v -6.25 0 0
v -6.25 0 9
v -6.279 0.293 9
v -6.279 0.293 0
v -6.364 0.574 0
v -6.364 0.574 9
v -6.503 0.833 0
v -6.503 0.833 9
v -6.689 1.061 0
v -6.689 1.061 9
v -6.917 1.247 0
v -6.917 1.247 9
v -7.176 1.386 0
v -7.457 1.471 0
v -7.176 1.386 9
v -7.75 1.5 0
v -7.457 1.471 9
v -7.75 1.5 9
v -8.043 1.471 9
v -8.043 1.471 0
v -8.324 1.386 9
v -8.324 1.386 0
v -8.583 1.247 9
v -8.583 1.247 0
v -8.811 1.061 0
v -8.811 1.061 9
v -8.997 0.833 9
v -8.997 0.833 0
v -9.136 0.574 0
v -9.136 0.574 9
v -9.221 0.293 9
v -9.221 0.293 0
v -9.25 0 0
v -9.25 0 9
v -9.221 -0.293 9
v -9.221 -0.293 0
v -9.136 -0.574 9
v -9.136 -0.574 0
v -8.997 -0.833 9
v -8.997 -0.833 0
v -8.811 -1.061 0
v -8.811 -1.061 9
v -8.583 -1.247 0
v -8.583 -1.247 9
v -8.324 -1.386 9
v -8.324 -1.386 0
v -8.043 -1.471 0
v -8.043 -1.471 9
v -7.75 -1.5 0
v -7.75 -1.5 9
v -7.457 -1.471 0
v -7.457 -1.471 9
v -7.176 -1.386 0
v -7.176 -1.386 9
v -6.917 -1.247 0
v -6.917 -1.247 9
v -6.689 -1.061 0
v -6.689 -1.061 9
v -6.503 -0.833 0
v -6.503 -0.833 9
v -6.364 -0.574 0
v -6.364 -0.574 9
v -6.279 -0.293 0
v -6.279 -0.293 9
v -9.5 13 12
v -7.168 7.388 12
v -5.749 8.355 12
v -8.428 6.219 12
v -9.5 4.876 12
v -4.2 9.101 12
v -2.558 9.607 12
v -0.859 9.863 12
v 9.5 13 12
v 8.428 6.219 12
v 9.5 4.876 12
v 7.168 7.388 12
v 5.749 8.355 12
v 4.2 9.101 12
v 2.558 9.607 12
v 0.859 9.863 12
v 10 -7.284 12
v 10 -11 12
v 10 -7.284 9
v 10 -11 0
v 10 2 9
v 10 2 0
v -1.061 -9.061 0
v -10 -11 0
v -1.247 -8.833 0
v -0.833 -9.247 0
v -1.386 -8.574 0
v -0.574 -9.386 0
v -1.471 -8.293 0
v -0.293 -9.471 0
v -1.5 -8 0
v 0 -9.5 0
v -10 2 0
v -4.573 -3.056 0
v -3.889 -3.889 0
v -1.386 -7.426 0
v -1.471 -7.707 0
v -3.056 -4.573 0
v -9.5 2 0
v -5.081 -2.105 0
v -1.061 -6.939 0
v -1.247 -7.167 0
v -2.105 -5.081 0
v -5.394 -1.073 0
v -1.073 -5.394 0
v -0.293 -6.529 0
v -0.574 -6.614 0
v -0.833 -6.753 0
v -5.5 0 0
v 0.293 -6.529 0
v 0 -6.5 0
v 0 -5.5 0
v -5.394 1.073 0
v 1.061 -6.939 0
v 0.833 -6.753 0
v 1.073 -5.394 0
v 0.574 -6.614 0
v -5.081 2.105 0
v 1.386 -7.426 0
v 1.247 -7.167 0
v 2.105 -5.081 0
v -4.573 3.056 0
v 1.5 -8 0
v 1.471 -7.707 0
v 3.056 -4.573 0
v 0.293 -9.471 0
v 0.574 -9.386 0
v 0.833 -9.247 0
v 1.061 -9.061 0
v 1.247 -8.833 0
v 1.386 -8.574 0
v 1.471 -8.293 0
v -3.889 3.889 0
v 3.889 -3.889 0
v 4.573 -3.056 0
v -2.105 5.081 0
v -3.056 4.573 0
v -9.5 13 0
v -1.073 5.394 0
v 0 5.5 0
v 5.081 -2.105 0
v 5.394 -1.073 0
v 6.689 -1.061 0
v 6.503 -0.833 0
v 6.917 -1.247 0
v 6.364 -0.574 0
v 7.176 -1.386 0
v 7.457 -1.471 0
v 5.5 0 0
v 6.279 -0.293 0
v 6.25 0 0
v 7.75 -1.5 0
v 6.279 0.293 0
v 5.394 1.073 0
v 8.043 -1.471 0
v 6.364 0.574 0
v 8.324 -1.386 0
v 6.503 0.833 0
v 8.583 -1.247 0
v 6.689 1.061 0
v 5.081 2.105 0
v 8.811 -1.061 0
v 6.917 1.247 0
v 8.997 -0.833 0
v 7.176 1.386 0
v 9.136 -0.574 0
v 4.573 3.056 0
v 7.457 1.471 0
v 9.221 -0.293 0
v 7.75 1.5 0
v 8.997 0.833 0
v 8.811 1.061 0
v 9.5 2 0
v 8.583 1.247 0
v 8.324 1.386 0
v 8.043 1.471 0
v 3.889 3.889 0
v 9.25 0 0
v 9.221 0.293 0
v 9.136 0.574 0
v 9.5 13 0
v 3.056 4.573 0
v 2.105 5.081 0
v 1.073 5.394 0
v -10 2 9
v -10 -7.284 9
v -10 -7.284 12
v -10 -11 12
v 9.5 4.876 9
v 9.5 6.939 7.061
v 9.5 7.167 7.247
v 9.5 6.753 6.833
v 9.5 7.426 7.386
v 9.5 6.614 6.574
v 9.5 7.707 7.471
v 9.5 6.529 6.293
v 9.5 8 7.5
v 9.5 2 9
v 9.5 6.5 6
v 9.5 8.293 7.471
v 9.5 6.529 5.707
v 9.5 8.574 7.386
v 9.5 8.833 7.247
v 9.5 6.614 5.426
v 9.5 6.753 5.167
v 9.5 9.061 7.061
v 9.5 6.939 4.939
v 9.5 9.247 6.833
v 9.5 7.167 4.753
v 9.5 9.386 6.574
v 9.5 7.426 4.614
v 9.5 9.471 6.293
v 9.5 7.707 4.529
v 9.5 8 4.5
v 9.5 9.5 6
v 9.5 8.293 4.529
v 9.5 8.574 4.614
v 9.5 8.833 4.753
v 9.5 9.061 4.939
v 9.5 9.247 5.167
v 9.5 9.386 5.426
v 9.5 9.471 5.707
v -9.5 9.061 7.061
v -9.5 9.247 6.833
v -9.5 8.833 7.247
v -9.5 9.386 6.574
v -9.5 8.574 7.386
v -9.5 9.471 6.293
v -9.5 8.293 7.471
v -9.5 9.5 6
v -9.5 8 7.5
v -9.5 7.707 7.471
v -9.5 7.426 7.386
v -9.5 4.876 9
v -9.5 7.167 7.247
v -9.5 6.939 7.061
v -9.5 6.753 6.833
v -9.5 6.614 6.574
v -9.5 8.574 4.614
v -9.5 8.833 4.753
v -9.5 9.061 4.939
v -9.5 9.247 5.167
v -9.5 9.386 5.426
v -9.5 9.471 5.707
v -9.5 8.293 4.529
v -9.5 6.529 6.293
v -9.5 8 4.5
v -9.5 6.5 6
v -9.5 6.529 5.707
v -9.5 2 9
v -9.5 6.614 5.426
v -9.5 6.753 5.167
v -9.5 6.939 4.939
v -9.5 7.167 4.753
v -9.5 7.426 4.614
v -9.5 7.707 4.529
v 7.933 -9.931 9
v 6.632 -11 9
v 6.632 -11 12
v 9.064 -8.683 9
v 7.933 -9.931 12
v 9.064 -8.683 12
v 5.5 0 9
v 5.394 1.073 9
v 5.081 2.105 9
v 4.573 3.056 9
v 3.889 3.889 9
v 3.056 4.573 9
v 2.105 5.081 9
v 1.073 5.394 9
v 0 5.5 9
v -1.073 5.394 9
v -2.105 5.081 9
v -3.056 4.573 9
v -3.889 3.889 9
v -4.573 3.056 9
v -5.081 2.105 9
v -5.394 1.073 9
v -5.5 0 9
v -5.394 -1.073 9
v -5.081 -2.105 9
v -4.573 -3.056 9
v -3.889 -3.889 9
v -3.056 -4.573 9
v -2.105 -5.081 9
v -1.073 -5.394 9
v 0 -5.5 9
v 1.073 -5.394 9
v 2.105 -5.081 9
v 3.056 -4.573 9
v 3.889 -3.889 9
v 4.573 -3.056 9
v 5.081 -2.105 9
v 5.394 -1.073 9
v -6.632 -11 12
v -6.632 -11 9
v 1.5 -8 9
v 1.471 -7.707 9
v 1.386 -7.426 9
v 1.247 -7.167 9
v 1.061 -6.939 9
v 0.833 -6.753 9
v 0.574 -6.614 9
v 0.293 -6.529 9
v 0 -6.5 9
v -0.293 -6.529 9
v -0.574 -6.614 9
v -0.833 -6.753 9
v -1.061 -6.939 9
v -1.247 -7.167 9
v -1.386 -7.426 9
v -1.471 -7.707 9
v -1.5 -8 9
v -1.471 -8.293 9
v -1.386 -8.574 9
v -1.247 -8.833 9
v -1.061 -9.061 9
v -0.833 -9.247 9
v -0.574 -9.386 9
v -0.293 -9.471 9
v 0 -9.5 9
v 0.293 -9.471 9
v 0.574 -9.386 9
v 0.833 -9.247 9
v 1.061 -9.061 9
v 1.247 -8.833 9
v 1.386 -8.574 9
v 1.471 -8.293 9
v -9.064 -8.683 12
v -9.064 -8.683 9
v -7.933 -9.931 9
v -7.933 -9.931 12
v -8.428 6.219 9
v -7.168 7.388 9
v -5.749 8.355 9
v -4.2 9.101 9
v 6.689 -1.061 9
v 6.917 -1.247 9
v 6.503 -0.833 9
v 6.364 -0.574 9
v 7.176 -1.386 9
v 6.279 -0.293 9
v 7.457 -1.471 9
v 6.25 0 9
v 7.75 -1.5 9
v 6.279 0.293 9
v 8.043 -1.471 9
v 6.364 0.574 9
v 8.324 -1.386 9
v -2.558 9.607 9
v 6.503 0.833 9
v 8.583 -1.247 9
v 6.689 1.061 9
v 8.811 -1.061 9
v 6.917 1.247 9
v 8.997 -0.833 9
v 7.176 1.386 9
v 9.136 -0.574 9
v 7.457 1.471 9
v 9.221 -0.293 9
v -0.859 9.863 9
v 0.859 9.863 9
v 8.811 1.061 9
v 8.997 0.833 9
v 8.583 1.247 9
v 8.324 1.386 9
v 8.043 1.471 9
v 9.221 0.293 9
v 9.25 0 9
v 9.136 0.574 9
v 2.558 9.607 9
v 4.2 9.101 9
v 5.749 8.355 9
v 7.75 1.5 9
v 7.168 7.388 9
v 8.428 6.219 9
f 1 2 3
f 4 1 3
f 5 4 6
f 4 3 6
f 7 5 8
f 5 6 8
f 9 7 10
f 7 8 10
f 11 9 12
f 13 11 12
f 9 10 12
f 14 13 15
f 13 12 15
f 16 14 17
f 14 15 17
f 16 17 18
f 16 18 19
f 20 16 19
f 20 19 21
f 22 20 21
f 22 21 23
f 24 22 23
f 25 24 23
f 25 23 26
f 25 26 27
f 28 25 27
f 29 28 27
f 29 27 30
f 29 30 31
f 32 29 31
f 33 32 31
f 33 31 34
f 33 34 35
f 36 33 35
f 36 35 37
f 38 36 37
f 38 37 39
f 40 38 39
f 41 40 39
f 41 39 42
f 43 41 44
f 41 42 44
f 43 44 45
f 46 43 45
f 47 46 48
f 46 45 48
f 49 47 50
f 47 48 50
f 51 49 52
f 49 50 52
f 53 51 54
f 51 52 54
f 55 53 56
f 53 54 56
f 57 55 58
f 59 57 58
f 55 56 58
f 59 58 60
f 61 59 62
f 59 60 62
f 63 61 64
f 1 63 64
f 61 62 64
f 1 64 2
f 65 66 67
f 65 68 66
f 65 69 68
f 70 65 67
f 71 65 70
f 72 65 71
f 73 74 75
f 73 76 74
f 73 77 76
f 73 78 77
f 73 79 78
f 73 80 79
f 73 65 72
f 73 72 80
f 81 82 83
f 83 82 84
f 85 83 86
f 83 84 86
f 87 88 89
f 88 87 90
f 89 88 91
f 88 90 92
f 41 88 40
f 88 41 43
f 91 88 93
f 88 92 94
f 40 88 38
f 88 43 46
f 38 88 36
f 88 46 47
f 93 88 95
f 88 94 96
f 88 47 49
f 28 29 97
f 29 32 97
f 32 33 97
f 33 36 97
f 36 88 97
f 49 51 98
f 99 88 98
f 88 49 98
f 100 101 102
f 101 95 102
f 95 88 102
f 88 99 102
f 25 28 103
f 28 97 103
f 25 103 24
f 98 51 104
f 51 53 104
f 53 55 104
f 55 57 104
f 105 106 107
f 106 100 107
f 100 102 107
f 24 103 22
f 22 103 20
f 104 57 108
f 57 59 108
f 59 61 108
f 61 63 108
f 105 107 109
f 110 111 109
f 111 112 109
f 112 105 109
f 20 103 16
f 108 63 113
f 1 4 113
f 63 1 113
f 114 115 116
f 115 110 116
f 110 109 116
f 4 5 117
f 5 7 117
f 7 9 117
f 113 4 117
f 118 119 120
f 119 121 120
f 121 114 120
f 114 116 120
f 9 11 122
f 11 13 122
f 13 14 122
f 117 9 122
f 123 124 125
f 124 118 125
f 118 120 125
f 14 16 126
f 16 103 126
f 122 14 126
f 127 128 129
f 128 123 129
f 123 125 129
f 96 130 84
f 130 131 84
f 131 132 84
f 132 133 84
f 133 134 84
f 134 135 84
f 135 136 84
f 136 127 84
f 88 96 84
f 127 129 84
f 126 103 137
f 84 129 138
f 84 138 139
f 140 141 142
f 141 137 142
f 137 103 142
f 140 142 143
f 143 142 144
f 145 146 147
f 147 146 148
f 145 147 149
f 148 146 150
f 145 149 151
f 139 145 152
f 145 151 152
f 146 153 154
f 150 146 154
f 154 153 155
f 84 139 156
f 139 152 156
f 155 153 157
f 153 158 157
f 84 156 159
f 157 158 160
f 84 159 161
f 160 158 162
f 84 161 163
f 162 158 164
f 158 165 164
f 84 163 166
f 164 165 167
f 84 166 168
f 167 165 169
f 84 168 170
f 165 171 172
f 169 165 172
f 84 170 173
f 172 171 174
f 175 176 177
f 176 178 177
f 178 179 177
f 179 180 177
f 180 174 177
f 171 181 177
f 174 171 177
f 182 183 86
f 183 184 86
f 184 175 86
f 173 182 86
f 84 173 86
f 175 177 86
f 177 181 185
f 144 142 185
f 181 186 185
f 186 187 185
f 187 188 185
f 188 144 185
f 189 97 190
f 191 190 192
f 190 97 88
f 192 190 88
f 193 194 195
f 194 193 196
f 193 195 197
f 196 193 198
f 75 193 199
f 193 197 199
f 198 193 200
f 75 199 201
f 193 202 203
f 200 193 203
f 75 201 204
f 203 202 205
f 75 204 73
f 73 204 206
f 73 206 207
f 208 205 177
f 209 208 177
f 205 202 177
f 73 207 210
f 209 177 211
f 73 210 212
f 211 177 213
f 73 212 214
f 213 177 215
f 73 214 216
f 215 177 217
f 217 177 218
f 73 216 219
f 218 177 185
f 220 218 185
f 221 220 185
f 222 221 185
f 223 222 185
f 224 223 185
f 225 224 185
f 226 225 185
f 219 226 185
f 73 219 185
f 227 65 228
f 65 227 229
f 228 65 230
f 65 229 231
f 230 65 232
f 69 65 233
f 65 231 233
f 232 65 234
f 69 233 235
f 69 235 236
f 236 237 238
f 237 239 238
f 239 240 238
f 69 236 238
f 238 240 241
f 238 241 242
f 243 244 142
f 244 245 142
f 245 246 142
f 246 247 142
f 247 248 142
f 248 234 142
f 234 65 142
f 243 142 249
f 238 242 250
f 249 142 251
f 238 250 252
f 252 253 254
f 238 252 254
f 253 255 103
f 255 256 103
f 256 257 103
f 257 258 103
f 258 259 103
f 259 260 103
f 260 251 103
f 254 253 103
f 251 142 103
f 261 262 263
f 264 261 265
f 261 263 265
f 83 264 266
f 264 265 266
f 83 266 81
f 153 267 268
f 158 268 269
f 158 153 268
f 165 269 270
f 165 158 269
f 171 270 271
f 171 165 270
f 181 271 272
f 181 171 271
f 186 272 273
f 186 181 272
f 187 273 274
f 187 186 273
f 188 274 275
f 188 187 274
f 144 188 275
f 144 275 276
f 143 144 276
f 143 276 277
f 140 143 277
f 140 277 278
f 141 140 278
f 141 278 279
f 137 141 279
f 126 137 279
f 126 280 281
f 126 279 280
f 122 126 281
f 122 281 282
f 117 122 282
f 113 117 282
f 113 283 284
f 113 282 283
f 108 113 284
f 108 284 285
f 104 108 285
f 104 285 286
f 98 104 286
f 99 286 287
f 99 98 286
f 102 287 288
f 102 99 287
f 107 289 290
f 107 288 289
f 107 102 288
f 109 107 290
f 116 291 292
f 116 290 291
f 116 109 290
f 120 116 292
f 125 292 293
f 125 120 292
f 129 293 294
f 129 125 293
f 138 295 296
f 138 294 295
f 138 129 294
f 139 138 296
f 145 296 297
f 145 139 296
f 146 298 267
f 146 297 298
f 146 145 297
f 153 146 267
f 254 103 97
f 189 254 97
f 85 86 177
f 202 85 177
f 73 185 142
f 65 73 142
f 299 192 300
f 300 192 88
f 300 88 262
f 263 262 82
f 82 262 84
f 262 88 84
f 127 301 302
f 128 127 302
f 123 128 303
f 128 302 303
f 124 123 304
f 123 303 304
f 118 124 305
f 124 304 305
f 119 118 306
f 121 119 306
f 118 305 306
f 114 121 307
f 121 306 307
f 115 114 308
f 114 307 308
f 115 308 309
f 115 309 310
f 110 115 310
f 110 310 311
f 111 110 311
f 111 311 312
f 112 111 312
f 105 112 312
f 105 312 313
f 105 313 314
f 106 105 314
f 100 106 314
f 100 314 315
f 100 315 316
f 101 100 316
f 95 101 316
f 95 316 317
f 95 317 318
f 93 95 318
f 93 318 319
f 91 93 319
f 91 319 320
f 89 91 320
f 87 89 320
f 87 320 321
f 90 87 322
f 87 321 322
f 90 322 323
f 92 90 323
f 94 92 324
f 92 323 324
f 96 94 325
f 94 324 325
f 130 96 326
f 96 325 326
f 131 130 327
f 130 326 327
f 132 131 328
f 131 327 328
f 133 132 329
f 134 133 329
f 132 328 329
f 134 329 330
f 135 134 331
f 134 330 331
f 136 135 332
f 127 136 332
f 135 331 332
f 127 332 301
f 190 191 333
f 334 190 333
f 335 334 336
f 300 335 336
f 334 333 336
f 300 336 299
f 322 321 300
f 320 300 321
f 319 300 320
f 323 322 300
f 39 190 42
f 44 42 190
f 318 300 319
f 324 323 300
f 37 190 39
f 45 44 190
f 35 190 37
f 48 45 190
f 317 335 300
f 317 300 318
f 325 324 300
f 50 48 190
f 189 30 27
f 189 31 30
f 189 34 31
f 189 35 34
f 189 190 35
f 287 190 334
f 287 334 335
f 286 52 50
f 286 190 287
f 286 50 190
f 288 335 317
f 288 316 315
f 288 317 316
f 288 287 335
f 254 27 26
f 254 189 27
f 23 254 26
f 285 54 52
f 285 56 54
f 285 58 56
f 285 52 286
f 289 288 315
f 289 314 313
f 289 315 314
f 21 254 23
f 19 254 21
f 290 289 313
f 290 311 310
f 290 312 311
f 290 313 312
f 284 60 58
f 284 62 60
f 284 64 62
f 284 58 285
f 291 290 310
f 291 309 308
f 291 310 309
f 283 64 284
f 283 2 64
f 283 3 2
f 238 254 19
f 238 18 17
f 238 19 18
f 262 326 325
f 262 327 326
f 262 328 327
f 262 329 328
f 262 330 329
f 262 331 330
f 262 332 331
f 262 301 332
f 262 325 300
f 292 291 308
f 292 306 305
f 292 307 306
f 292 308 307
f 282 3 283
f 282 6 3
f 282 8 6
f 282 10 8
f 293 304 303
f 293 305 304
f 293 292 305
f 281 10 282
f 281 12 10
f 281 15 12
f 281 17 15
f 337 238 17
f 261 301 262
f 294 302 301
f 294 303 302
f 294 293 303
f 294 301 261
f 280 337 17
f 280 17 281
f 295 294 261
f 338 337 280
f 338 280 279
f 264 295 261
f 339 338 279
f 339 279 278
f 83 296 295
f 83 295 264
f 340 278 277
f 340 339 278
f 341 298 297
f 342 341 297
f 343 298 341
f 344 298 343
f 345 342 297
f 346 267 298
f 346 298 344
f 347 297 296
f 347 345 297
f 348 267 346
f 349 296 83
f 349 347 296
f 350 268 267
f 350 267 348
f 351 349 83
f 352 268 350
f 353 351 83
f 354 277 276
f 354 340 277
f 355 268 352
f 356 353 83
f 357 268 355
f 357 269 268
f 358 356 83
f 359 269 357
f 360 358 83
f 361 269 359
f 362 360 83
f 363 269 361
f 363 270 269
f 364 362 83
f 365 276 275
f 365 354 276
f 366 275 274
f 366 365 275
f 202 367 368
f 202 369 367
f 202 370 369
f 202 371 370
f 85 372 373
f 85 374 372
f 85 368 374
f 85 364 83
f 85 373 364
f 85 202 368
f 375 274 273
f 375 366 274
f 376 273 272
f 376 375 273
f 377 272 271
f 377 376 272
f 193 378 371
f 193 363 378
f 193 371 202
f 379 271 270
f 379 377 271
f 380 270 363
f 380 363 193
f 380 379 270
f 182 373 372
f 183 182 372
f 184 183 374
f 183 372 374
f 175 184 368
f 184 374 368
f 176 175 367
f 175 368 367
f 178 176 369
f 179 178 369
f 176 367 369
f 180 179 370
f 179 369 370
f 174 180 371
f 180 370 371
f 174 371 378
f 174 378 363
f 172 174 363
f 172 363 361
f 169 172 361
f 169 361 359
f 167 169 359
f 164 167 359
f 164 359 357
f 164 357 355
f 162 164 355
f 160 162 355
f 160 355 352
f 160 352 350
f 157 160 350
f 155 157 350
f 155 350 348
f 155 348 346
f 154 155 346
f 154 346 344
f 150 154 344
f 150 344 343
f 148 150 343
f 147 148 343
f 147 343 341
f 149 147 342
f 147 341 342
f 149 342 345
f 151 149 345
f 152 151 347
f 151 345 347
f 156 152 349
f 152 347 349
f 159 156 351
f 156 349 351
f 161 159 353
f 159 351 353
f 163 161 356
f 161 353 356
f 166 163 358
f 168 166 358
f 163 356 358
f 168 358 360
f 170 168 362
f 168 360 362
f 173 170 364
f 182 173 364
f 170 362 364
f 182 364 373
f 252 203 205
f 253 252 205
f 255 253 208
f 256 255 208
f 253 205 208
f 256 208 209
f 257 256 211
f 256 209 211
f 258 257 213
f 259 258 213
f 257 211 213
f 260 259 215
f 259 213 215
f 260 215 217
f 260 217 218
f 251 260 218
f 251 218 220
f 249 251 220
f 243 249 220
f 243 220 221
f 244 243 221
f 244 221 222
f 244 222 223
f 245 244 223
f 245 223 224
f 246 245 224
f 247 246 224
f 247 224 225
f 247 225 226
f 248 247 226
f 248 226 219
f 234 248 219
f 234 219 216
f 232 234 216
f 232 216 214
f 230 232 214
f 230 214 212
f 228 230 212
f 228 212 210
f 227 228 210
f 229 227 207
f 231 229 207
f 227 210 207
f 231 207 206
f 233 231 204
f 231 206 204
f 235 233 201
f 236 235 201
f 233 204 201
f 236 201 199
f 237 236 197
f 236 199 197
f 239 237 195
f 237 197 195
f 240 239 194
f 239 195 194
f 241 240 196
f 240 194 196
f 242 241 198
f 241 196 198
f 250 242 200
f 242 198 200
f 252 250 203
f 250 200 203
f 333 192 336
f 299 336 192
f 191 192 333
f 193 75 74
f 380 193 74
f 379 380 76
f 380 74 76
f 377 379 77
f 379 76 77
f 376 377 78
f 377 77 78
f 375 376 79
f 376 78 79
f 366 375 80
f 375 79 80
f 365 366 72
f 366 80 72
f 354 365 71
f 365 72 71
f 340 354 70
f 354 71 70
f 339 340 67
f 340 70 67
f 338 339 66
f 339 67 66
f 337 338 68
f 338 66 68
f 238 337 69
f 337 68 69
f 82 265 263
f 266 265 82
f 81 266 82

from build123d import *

# Parameters (mm, degrees)
F0_R     = 5.5
F1_DEPTH = 12
F2_R     = 1.5
F3_DEPTH = 12
F5_DEPTH = 22
F6_R     = 11.5
F7_DEPTH = 3


with BuildPart() as f1:
    # F0 (on Top) → F1 (new body)
    with BuildSketch(Plane.XY):
        Polygon((9.5, 2), (9.5, 13), (-9.5, 13), (-9.5, 2), (-10, 2), (-10, -11), (10, -11), (10, 2), align=None)
        Circle(F0_R, mode=Mode.SUBTRACT)
    extrude(amount=F1_DEPTH)

    # F2 (on face) → F3 (cut)
    with BuildSketch(Plane.XY.offset(12)):
        with Locations((7.75, 0)):
            Circle(F2_R)
        with Locations((-7.75, 0)):
            Circle(F2_R)
        with Locations((0, -8)):
            Circle(F2_R)
    extrude(amount=-F3_DEPTH, mode=Mode.SUBTRACT)

    # F4 (on face) → F5 (cut)
    with BuildSketch(Plane.YZ.offset(9.5)):
        with BuildLine():
            ThreePointArc((9.5, 6), (8, 7.5), (6.5, 6))
            ThreePointArc((6.5, 6), (8, 4.5), (9.5, 6))
        make_face()
    extrude(amount=-F5_DEPTH, mode=Mode.SUBTRACT)

    # F6 (on face) → F7 (cut)
    with BuildSketch(Plane.XY.offset(12)):
        with Locations((0, -1.604815)):
            Circle(F6_R)
    extrude(amount=-F7_DEPTH, mode=Mode.SUBTRACT)


solid = f1.part
